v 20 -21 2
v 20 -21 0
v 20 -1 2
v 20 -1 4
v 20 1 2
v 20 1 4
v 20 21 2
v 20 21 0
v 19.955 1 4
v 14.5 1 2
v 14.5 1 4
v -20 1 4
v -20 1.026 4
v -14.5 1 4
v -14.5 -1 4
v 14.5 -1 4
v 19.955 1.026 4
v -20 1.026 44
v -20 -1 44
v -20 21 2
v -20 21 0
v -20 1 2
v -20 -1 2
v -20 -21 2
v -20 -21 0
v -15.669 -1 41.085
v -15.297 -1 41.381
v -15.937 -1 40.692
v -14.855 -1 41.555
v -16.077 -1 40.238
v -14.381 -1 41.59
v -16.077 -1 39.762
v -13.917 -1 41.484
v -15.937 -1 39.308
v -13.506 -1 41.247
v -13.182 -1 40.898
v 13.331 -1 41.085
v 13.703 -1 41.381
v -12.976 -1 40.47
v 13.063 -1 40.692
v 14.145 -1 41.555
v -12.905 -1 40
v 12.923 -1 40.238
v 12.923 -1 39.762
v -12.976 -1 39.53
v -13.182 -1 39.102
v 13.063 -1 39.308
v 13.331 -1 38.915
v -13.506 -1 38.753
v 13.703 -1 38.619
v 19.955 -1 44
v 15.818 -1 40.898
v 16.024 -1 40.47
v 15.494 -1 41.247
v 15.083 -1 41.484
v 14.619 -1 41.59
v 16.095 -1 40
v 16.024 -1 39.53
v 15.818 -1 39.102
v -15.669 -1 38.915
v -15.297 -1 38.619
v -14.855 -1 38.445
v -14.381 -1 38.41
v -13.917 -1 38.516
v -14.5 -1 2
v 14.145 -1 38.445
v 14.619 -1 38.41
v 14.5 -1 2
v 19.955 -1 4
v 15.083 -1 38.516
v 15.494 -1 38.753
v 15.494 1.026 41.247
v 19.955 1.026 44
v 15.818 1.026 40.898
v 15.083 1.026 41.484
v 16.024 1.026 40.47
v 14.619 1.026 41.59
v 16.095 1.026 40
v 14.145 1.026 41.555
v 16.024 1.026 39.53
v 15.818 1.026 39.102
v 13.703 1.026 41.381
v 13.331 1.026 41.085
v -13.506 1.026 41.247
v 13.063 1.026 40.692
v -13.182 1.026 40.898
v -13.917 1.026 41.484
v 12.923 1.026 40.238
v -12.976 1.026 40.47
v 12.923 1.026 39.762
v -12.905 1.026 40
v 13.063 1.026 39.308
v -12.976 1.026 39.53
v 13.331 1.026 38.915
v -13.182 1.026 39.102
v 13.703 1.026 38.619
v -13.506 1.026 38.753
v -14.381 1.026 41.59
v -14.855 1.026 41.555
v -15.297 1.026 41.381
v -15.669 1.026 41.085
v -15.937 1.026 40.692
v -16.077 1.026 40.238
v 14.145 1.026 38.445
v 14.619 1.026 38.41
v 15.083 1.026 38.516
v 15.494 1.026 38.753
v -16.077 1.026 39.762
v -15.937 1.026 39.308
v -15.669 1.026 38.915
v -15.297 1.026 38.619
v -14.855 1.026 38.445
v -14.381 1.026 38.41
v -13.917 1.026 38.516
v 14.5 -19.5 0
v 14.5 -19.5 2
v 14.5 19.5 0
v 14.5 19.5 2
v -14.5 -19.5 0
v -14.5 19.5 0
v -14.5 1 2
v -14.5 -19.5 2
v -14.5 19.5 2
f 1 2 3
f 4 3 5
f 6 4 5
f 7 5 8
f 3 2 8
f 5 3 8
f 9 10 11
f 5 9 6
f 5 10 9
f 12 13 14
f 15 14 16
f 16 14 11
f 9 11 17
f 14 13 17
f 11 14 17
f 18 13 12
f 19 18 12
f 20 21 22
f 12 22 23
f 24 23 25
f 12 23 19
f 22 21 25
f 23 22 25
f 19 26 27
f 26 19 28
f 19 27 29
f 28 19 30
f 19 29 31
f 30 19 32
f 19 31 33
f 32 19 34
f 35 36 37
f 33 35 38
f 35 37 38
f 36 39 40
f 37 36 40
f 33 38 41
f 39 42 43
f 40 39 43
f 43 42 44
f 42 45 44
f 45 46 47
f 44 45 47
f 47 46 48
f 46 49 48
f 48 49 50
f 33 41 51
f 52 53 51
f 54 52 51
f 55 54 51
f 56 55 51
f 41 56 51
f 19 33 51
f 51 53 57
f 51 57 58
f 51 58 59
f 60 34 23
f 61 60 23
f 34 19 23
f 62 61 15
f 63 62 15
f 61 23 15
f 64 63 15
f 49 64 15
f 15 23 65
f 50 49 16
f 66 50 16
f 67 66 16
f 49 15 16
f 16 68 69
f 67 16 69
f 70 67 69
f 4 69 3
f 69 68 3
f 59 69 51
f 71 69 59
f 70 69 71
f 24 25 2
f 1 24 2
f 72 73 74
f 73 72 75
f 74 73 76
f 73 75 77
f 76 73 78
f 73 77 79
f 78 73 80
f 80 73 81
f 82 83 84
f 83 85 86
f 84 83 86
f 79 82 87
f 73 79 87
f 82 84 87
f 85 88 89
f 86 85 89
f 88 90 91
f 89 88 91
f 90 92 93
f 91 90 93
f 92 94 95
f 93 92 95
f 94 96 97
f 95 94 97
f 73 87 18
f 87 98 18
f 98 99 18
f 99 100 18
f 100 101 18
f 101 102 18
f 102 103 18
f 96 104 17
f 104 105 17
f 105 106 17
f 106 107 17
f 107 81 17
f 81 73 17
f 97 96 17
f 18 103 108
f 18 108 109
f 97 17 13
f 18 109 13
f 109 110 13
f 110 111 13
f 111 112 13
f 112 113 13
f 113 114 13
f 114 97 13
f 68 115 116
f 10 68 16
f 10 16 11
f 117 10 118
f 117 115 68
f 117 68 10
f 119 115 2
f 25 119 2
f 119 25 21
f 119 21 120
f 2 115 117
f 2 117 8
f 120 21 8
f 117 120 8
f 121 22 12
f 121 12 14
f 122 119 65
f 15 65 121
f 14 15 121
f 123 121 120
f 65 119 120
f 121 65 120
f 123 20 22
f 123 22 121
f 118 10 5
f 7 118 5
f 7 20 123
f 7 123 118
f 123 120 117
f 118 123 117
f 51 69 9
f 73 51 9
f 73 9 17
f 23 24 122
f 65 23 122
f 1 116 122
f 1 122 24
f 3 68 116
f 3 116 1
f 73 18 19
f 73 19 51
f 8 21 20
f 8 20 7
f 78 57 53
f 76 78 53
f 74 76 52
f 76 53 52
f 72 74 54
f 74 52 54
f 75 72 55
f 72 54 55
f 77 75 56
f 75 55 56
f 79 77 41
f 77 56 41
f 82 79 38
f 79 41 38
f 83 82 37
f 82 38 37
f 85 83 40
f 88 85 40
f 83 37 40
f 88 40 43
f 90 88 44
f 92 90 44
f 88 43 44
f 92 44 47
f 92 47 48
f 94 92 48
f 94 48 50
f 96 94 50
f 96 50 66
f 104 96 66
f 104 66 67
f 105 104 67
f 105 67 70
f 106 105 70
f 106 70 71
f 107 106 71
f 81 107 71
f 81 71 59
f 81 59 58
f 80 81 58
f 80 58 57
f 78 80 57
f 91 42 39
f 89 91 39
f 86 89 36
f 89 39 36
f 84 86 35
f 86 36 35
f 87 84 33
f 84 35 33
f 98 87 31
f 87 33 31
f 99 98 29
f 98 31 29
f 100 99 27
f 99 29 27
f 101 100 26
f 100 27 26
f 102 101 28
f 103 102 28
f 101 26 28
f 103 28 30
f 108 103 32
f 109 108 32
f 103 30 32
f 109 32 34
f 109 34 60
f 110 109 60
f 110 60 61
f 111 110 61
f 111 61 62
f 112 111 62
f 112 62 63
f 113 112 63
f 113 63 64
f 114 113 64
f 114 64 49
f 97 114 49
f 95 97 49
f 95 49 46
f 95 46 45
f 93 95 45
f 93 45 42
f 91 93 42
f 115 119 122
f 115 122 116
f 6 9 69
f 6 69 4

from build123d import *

# Parameters (mm, degrees)
F0_W     = 40
F0_H     = 42
F0_W_2   = 29
F0_H_2   = 39
F1_DEPTH = 2
F2_W     = 5.5
F2_H     = 2
F3_DEPTH = 2
F4_W     = 5.5
F4_H     = 2
F5_DEPTH = 40
F6_R     = 1.594694
F7_DEPTH = 3


with BuildPart() as f1:
    # F0 (on Top) → F1 (new body)
    with BuildSketch(Plane.XY):
        Rectangle(F0_W, F0_H)
        Rectangle(F0_W_2, F0_H_2, mode=Mode.SUBTRACT)
    extrude(amount=F1_DEPTH)

    # F2 (on face) → F3 (join)
    with BuildSketch(Plane.XY.offset(2)):
        with Locations((-17.25, 0)):
            Rectangle(F2_W, F2_H)
        with Locations((17.25, 0)):
            Rectangle(F2_W, F2_H)
    extrude(amount=F3_DEPTH)

    # F4 (on face) → F5 (join)
    with BuildSketch(Plane.XY.offset(4)):
        Polygon((-14.5, 1), (-14.5, -1), (19.954836, -1), (19.954836, 1.025821), (-20, 1.025821), (-20, 1), align=None)
        with Locations((-17.25, 0)):
            Rectangle(F4_W, F4_H)
    extrude(amount=F5_DEPTH)

    # F6 (on face) → F7 (cut)
    with BuildSketch(Plane.XZ.offset(1)):
        with Locations((-14.5, 40)):
            Circle(F6_R)
        with Locations((14.5, 40)):
            Circle(F6_R)
    extrude(amount=-F7_DEPTH, mode=Mode.SUBTRACT)


solid = f1.part
